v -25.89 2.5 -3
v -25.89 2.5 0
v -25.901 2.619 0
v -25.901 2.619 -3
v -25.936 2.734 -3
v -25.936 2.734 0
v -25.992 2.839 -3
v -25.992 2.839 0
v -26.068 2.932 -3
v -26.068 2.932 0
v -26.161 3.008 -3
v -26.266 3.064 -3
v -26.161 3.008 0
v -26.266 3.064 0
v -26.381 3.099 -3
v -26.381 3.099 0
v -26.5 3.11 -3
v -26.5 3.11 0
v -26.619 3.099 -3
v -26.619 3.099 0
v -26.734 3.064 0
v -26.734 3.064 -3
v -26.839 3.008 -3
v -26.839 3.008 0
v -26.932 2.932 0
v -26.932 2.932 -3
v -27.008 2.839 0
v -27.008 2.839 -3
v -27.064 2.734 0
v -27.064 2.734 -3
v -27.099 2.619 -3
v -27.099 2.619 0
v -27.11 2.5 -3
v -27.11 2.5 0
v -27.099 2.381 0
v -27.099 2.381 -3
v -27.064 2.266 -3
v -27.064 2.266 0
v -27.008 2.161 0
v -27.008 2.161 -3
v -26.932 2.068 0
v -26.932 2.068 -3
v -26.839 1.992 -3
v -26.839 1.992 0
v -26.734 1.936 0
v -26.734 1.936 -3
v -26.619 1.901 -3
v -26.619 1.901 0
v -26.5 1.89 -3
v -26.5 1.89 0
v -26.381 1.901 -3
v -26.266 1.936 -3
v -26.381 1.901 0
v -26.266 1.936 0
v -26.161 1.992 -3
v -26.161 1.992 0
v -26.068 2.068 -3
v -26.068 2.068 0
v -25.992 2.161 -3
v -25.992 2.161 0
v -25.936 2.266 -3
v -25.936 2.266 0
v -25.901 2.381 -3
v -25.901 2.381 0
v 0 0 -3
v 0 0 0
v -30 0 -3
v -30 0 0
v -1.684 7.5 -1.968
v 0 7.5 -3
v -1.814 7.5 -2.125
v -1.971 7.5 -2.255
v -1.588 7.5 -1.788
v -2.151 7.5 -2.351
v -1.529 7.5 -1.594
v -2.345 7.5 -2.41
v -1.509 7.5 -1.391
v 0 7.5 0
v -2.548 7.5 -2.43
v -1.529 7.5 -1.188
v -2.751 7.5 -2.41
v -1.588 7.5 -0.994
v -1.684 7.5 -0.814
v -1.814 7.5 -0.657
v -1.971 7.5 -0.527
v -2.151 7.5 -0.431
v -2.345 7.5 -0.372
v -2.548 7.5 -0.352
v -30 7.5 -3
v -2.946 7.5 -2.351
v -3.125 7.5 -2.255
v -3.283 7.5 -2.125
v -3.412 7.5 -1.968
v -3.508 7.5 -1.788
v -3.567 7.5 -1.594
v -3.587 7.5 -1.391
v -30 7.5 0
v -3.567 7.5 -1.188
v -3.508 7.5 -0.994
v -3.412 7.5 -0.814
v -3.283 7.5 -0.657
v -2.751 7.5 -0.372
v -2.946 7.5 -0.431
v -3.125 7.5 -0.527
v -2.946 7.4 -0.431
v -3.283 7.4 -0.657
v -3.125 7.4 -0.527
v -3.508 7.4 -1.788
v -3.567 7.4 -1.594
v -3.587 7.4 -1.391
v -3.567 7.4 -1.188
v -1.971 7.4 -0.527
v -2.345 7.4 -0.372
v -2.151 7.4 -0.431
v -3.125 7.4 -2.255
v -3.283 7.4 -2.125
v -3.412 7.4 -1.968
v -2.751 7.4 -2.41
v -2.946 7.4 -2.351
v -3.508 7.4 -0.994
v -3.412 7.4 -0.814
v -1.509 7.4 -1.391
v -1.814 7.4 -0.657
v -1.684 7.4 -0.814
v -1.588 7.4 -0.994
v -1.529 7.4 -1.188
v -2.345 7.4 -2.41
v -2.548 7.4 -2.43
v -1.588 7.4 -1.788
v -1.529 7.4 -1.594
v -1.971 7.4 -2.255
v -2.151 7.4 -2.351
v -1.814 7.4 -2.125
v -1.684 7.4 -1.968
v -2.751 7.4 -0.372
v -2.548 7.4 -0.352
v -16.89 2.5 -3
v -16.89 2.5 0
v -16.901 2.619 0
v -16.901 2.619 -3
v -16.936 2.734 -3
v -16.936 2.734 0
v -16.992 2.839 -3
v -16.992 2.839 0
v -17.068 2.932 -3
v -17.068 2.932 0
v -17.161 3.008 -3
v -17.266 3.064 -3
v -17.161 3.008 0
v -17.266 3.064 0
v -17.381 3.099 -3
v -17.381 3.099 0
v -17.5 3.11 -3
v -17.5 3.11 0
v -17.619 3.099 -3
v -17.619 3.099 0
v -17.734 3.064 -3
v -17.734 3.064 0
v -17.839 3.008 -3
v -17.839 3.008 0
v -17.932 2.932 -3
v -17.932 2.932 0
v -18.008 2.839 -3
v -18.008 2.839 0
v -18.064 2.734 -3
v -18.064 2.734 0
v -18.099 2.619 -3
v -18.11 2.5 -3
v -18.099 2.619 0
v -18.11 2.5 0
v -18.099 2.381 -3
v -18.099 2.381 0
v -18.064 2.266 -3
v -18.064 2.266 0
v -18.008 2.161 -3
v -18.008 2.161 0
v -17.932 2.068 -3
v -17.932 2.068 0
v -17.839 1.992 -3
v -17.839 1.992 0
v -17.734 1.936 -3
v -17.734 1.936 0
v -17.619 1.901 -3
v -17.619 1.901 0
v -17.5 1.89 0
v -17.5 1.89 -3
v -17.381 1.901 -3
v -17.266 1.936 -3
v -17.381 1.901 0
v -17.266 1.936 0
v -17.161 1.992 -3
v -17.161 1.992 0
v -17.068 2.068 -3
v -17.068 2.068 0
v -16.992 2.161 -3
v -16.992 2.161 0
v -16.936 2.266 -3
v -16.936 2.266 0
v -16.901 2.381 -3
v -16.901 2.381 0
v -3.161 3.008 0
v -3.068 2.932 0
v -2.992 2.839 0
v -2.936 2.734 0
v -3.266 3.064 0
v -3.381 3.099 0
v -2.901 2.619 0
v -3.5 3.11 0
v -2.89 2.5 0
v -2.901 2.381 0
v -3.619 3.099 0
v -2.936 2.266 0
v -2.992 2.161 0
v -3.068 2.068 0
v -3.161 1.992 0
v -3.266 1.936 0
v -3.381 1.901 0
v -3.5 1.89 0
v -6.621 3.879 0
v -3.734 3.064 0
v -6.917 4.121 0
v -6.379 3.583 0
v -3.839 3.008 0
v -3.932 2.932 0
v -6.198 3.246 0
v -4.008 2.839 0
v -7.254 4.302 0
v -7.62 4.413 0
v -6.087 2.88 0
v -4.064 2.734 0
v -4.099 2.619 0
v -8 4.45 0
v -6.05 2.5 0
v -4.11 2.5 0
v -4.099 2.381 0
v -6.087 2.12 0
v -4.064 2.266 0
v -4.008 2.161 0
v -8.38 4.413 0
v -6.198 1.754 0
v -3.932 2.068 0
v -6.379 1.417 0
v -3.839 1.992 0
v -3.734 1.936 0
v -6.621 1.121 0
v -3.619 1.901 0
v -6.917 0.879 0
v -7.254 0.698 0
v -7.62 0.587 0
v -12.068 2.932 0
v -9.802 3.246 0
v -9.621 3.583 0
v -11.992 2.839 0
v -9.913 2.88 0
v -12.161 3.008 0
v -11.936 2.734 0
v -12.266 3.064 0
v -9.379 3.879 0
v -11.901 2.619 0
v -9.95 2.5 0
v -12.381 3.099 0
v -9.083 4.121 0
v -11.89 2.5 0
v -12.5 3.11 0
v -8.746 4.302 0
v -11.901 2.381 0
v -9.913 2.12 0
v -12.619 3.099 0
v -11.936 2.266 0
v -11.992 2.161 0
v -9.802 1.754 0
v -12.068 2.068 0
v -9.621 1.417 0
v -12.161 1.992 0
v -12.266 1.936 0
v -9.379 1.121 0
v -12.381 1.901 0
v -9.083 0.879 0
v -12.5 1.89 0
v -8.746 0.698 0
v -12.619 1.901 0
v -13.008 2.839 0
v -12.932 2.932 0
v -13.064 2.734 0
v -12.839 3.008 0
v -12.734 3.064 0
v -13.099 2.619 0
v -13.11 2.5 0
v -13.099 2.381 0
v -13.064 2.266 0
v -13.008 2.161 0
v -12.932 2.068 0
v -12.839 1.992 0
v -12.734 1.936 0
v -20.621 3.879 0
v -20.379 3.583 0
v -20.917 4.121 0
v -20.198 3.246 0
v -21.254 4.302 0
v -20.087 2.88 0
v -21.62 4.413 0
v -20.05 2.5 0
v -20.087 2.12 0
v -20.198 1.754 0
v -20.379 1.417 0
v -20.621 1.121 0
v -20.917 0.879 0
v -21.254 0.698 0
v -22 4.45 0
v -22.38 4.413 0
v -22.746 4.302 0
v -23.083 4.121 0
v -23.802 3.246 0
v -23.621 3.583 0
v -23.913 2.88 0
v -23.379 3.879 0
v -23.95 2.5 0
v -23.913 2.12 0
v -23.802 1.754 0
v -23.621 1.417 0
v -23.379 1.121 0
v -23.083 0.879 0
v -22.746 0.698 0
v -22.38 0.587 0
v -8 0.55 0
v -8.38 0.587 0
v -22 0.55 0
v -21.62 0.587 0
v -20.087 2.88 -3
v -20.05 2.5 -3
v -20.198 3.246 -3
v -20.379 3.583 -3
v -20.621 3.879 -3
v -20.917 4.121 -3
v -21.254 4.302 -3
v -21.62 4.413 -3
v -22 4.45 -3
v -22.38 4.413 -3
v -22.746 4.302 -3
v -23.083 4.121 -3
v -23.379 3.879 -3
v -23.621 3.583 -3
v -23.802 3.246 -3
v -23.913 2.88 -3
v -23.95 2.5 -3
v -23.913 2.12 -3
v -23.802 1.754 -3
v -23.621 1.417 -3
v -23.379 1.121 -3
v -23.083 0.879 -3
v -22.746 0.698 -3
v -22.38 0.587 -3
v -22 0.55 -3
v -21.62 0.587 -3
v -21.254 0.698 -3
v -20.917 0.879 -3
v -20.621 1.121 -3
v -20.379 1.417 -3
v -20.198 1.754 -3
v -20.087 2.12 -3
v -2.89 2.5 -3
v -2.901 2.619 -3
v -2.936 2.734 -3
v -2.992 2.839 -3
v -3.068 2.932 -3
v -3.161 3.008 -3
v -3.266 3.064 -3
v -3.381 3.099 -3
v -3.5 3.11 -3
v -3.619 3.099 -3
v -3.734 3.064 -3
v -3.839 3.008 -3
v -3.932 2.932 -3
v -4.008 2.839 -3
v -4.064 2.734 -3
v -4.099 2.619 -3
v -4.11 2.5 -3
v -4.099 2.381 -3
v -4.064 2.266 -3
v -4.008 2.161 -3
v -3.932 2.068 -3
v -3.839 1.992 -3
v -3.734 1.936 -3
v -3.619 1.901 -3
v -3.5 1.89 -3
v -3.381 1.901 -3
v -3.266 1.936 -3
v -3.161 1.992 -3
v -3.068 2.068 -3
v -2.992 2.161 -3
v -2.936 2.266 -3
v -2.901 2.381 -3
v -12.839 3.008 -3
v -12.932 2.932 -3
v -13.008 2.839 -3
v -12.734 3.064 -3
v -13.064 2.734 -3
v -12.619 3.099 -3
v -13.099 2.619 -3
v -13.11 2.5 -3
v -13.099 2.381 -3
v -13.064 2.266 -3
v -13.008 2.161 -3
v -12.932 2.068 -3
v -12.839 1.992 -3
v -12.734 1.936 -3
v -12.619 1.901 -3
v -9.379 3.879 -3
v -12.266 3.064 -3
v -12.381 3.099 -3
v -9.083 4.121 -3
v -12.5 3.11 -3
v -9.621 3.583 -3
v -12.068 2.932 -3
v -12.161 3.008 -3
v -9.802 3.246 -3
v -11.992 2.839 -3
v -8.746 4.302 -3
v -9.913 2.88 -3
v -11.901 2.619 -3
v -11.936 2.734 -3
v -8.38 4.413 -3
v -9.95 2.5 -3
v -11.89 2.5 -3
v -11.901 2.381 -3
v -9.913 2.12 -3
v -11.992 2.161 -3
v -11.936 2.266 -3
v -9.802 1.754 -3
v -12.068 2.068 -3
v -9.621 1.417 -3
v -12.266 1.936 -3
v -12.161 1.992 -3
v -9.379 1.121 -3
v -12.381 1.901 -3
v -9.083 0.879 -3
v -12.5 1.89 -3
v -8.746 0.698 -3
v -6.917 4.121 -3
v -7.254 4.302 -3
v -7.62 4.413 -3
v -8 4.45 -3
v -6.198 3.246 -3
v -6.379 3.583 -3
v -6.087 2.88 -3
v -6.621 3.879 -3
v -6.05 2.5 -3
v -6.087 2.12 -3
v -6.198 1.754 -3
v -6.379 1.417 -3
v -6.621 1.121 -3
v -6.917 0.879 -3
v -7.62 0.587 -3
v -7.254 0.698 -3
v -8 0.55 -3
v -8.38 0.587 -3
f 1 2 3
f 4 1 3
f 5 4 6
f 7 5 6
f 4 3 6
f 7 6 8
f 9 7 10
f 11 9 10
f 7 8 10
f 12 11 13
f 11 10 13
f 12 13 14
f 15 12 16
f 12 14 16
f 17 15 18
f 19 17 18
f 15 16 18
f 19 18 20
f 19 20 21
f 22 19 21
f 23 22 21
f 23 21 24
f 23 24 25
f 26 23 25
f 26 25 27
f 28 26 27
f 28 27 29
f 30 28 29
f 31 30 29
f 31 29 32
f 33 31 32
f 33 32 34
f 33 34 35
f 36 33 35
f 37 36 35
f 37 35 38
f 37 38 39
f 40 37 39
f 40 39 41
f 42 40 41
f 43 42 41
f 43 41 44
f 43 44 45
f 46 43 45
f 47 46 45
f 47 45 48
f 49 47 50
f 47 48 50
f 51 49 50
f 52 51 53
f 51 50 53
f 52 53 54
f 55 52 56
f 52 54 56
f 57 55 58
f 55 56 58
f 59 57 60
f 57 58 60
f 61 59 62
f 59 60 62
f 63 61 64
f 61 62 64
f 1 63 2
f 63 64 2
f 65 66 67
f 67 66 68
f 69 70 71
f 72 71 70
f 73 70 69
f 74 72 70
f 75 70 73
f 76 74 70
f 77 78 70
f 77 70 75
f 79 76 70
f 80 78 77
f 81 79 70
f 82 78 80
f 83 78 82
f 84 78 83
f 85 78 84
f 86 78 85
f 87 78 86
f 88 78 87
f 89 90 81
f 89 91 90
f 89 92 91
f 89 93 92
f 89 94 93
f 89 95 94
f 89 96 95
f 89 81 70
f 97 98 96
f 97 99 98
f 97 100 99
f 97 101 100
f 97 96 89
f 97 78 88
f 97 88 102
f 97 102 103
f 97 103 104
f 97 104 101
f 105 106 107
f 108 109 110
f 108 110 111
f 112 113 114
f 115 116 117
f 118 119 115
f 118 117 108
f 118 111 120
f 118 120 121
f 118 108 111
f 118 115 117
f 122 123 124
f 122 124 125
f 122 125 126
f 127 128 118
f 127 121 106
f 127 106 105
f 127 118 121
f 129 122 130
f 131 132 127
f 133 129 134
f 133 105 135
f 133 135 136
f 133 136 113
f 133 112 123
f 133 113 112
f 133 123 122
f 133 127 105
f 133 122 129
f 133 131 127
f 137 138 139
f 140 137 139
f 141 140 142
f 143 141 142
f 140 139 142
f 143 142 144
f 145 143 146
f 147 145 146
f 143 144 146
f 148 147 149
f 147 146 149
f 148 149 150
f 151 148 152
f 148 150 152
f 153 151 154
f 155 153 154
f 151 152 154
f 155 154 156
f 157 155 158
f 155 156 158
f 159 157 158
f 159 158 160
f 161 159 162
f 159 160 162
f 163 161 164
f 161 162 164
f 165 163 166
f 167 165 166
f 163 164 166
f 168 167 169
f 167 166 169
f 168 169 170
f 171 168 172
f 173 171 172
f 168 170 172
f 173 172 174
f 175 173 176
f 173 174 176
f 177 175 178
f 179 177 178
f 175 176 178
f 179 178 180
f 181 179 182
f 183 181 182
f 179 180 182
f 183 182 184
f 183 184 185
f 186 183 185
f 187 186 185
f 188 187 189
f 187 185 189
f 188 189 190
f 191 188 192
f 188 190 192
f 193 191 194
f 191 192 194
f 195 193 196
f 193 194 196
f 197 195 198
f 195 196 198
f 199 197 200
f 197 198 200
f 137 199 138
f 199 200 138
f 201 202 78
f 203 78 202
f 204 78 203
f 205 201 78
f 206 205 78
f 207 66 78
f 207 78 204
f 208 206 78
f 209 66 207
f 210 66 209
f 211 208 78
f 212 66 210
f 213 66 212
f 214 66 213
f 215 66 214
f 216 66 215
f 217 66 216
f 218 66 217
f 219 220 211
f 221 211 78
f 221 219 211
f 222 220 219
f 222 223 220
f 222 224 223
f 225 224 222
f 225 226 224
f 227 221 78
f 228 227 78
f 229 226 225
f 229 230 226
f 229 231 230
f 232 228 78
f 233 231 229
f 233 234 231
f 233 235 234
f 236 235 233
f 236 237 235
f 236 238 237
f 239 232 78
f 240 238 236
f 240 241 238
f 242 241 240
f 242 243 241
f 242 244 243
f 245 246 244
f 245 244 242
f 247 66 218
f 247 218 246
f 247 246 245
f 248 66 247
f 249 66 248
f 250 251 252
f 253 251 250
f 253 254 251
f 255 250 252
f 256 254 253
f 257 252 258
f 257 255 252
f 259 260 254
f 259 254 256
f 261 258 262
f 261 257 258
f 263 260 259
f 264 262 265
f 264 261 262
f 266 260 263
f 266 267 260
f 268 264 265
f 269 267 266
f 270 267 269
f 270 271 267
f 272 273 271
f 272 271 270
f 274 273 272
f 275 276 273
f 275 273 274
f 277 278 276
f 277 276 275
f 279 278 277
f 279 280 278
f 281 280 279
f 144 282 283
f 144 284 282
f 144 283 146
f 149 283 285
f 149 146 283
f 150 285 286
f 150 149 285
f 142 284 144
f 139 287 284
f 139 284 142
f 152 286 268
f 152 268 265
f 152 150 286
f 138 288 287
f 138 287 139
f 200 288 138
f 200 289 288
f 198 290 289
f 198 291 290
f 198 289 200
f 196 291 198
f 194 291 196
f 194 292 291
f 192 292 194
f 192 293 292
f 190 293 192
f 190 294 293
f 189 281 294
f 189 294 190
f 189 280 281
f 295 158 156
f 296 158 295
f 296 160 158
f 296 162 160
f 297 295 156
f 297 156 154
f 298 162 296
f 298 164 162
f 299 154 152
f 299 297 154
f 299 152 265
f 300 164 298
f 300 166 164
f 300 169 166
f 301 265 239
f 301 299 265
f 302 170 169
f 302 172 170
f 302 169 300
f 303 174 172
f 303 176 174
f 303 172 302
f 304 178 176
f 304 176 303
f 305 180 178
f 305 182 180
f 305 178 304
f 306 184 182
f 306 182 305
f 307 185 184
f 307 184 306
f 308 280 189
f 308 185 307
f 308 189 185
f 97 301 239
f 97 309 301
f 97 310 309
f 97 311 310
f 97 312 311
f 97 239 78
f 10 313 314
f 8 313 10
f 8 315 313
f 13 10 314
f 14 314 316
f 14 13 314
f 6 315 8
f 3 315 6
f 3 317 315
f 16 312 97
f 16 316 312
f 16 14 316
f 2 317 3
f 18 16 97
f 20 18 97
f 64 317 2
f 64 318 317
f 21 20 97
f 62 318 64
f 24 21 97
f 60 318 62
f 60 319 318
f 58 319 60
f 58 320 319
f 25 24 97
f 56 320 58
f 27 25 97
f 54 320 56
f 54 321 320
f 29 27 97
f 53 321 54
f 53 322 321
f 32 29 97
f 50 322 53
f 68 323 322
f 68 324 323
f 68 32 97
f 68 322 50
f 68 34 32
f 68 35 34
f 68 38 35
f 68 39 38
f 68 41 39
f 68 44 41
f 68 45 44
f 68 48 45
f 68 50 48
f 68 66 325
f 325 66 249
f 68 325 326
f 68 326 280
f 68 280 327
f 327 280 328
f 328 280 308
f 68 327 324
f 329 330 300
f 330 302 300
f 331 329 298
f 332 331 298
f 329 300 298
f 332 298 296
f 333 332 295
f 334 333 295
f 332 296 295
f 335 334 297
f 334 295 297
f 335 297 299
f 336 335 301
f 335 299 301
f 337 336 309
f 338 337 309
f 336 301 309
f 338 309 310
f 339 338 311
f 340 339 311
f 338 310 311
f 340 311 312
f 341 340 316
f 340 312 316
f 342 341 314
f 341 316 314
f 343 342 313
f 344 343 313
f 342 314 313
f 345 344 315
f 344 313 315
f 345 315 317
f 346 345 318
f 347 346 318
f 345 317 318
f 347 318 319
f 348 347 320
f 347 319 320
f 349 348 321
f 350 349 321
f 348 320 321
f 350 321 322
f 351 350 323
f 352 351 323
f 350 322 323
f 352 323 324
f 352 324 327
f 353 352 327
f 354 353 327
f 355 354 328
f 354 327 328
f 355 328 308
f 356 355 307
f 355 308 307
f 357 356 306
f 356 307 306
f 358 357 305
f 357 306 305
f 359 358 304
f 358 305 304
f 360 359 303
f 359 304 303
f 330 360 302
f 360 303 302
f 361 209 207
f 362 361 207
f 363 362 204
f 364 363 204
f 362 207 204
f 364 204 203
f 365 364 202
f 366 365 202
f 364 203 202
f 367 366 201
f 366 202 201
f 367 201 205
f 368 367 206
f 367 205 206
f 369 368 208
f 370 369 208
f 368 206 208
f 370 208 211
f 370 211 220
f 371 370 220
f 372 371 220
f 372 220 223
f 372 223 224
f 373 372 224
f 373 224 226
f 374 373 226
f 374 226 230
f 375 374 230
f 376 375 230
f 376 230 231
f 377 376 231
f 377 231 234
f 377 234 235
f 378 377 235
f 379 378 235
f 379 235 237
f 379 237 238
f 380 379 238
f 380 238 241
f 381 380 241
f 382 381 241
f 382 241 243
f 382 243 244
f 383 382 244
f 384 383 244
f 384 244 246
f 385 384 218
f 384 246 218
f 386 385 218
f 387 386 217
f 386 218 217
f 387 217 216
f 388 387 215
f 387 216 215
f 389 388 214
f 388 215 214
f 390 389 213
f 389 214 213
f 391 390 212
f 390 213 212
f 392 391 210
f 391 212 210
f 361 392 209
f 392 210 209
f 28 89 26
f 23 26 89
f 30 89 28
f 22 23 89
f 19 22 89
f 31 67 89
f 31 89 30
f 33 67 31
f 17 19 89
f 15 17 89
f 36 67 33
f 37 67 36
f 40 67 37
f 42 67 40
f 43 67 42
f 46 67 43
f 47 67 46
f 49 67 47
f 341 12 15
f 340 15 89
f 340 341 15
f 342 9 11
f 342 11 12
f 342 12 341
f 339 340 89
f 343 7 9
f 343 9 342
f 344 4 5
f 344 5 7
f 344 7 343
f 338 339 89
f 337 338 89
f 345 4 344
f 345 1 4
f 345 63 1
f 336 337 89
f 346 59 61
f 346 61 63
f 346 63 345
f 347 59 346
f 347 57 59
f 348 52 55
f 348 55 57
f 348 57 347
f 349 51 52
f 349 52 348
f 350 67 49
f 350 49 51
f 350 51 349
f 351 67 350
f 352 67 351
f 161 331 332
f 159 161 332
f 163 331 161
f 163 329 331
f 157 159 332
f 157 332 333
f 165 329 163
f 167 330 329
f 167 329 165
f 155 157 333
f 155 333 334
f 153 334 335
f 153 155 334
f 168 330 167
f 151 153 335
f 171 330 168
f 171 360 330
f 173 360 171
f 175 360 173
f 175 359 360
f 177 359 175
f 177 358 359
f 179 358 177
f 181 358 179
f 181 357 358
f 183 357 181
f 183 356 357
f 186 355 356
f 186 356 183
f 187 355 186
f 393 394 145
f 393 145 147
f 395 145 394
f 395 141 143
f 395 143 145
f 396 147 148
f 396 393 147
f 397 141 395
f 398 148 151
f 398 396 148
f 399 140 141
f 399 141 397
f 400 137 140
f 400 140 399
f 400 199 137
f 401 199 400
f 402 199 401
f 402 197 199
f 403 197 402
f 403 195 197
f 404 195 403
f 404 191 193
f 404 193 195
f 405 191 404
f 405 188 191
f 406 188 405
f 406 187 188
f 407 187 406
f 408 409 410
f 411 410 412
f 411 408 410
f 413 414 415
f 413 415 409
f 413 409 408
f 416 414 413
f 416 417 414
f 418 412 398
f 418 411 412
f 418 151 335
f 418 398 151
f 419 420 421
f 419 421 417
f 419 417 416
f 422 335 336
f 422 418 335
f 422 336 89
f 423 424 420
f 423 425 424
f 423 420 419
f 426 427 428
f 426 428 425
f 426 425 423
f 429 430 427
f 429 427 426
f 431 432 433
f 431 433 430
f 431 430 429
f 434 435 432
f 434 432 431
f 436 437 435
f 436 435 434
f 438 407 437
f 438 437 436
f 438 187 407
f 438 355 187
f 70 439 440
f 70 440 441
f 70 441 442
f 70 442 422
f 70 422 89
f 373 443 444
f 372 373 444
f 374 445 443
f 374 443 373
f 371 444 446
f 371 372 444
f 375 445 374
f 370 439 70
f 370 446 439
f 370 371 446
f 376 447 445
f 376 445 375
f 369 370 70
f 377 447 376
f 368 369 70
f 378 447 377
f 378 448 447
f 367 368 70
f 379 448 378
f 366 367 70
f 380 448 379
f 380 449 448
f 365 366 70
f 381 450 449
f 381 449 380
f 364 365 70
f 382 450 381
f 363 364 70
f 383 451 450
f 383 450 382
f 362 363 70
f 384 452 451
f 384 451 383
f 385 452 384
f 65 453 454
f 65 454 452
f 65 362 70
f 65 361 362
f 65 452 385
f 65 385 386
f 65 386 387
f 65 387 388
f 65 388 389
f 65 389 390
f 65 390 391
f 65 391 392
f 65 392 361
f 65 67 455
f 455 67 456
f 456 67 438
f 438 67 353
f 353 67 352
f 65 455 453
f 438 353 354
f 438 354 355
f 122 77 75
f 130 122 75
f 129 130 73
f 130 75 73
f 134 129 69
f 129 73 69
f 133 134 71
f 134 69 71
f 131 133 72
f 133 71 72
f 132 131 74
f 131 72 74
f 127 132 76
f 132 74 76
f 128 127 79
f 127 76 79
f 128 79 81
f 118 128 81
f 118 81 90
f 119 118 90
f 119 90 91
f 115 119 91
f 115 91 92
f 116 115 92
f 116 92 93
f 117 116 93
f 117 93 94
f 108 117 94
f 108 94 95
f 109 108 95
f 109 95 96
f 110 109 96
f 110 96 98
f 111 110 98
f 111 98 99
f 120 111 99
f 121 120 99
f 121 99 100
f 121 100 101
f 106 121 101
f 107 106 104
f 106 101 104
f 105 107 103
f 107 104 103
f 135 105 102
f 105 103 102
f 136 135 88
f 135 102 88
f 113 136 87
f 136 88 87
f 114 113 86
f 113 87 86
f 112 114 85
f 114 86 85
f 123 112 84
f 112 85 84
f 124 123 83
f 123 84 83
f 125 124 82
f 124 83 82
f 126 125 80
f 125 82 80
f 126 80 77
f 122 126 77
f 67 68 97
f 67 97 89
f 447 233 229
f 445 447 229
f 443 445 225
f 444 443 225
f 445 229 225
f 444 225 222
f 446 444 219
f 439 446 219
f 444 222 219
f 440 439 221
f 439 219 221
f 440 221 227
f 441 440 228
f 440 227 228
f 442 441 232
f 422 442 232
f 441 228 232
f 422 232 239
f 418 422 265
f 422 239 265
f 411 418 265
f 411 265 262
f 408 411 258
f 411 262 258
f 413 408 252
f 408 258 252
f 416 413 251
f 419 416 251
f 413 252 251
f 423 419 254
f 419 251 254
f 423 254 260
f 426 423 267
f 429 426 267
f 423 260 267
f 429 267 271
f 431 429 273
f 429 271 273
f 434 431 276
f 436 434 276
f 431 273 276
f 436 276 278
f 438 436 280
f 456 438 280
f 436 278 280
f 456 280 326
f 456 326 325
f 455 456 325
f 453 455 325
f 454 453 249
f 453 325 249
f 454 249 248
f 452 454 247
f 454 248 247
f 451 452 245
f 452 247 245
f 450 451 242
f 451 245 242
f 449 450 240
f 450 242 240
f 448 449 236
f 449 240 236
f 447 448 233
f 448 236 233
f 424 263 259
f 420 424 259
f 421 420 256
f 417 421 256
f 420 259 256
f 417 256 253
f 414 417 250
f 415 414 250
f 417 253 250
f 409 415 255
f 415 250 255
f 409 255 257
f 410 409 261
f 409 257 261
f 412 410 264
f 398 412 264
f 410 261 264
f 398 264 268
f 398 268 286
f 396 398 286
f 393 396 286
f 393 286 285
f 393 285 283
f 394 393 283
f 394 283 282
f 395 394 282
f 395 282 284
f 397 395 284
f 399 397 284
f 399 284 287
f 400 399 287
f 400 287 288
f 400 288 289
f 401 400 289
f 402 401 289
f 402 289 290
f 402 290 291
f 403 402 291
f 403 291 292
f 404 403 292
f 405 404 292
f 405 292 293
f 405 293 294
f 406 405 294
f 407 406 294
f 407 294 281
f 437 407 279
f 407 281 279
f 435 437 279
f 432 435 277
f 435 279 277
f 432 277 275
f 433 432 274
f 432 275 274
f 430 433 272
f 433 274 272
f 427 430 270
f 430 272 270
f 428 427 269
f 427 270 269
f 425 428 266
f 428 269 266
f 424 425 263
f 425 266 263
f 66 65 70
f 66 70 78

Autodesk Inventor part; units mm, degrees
ref_plane "YZ Plane" through (0, 0, 0) normal (1, 0, 0) x (0, 1, 0)
ref_plane "XZ Plane" through (0, 0, 0) normal (0, 1, 0) x (-1, 0, 0)
ref_plane "XY Plane" through (0, 0, 0) normal (0, 0, 1) x (1, 0, 0)
sketch "Sketch1" plane through (0, 0, 0) normal (0, 1, 0) x (-1, 0, 0)
  line L0 (0, 0) -> (30, 0)
  line L1 (30, 0) -> (30, -3)
  line L2 (30, -3) -> (0, -3)
  line L3 (0, -3) -> (0, 0)
  dimension "d0" = 30
  dimension "d1" = 3
extrude "Extrusion1" add sketch "Sketch1" along normal blind 7.5
sketch "Sketch2" plane through (0, 7.5, 0) normal (0, 1, 0) x (1, 0, 0)
  circle A0 centre (-2.5481, 1.391) radius 1.0387
  point P0 (0, 0)
extrude "Extrusion2" cut sketch "Sketch2" against normal blind 0.1
sketch "Sketch3" plane through (-30, 0, 0) normal (0, 0, 1) x (1, 0, 0)
  circle A0 centre (26.5, 2.5) radius 0.6105
  line L0 (0, 0) -> (30, 0) projected
  line L1 (30, 0) -> (30, 7.5) projected
  circle A1 centre (22, 2.5) radius 1.95
  circle A2 centre (17.5, 2.5) radius 0.6105
  line L2 (30, 7.5) -> (0, 7.5) projected
  line L3 (0, 7.5) -> (30, 7.5)
  line L4 (30, 7.5) -> (15, 7.5)
  line L5 (15, 7.5) -> (15, 0)
  circle A3 centre (3.5, 2.5) radius 0.6105
  circle A4 centre (8, 2.5) radius 1.95
  circle A5 centre (12.5, 2.5) radius 0.6105
  dimension "d6" = 1.221
  dimension "d7" = 2.5
  dimension "d8" = 3.5
  dimension "d9" = 3.9
  dimension "d10" = 8
  dimension "d11" = 1.221
  dimension "d12" = 2.5
  dimension "d13" = 4.5
extrude "Extrusion3" cut sketch "Sketch3" against normal blind 3 contours A0 | A1 | A2 | A3 | A4 | A5
properties part number "backmidmotorwall"
